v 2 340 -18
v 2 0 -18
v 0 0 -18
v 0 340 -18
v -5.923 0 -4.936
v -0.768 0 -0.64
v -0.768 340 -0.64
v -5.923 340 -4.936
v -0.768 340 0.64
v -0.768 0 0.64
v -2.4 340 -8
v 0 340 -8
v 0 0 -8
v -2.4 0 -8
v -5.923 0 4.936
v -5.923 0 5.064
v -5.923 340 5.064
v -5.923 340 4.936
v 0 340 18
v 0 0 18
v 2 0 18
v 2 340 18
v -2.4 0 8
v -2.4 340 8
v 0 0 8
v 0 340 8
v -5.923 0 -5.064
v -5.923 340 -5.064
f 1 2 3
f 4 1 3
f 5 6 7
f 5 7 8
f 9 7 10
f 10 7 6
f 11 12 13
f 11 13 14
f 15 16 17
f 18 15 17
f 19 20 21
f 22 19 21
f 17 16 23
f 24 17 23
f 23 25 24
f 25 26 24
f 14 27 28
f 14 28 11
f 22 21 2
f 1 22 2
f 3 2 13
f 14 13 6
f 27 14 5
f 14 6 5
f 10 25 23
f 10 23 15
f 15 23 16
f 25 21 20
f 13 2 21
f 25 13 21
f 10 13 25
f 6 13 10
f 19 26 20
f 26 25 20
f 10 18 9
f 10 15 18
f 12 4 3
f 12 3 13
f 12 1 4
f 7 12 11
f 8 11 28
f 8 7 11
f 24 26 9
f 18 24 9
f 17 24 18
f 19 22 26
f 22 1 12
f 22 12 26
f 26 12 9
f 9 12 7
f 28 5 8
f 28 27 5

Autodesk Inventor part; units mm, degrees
ref_plane "YZ Plane" through (0, 0, 0) normal (1, 0, 0) x (0, 1, 0)
ref_plane "XZ Plane" through (0, 0, 0) normal (0, 1, 0) x (-1, 0, 0)
ref_plane "XY Plane" through (0, 0, 0) normal (0, 0, 1) x (1, 0, 0)
sketch "Sketch1" plane through (0, 0, 0) normal (0, 1, 0) x (-1, 0, 0)
  line L0 (6, 5) -> (0, 5)
  line L1 (0, 5) -> (0, -5)
  line L2 (0, -5) -> (6, -5)
  line L3 (6, -5) -> (6, 5)
  line L4 (6, 5) -> (0, 0)
  line L5 (0, 0) -> (6, -5)
  line L6 (6, -5) -> (0, -10)
  line L7 (0, 18) -> (-2, 18)
  line L8 (-2, 18) -> (-2, -18)
  line L9 (-2, -18) -> (0, -18)
  line L10 (0, -18) -> (0, 18)
  line L11 (6, 5) -> (0, 10)
  point P0 (0, -10)
  point P1 (0, -5)
  point P2 (0, 5)
extrude "Extrusion1" add sketch "Sketch1" along normal blind 340 contours L4 L1 L0 | L0 L10 L11 | L1 L10 L9 L8 L7 | L6 L10 L2 | L2 L1 L5
chamfer "Chamfer1" distance 0.1 angle 45 2 edges at (-6, 170, -5) (-6, 170, 5)
chamfer "Chamfer2" distance 1 angle 45 1 edges at (0, 170, 0)
sketch "Sketch2" plane through (0, 340, 0) normal (0, 1, 0) x (1, 0, 0)
  line L0 (-4, 12) -> (0, 12)
  line L1 (0, 12) -> (0, 8)
  line L2 (0, 8) -> (-4, 8)
  line L3 (-4, 8) -> (-4, 12)
  line L4 (-4, -12) -> (0, -12)
  line L5 (0, -12) -> (0, -8)
  line L6 (0, -8) -> (-4, -8)
  line L7 (-4, -8) -> (-4, -12)
  point P0 (0, 0)
extrude "Extrusion2" cut sketch "Sketch2" against normal blind 1000
properties part number "RailDerzavka"
